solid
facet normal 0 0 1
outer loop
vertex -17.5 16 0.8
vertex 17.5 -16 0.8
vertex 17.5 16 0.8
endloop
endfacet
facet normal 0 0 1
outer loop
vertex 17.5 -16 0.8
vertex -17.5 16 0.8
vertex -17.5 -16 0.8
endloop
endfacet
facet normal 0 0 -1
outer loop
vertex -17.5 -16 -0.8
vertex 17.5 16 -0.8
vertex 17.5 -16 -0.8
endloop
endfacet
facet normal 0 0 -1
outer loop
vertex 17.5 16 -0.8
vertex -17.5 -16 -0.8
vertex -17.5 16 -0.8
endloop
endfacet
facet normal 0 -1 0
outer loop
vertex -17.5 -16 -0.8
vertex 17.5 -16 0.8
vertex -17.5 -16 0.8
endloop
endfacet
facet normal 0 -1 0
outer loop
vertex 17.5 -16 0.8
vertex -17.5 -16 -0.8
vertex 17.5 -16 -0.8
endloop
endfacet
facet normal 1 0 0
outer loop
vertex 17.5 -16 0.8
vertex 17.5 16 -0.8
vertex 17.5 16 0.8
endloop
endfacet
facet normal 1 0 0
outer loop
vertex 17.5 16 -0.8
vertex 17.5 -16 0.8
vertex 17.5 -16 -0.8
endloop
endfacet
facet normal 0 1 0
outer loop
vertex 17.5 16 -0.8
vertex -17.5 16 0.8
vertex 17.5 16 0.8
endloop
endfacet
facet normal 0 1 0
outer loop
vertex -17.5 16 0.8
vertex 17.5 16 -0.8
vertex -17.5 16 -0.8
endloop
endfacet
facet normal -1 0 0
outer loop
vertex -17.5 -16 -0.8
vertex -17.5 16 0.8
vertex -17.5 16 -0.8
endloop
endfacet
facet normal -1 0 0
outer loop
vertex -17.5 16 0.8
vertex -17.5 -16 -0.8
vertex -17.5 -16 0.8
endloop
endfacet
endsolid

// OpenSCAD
// Parameters
length = 35.0; //[17.5:70.0:0.1]
width = 32.0; //[16.0:64.0:0.1]
thickness = 1.6; //[0.8:3.2:0.1]

// PCB Module
module pcb() {
  color([0.0, 0.4, 0.2]) { // Green color for PCB
    cube([length, width, thickness], center=true);
  }
}

// Assembly
module assembly() {
  pcb();
}

assembly();
